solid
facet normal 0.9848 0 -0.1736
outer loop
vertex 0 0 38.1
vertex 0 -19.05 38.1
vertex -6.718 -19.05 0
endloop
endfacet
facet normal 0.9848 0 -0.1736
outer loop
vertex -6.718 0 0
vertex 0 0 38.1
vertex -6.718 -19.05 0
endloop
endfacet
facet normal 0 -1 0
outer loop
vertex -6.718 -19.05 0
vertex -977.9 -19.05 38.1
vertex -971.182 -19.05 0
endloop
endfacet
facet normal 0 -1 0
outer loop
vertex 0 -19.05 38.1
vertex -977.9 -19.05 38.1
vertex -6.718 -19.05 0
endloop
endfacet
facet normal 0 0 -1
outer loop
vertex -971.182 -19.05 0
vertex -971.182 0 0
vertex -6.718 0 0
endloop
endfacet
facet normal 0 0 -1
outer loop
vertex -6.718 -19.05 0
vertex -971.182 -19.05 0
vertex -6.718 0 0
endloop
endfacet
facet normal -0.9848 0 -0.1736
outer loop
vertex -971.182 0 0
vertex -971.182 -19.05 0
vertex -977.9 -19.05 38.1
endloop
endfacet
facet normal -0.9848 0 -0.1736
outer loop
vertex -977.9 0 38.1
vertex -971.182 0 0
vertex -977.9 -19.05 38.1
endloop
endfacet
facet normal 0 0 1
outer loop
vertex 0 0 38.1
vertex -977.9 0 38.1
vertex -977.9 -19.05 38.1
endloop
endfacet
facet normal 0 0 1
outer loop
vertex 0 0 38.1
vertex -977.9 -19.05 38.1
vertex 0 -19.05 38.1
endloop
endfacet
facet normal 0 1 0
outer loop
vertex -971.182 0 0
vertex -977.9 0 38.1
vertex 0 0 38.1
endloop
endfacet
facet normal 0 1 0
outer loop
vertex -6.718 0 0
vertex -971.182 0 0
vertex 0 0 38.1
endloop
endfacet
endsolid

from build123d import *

# Parameters (mm, degrees)
F0_W     = 977.9
F0_H     = 38.1
F1_DEPTH = 19.05
F3_DEPTH = 25.4
F5_DEPTH = 25.4


with BuildPart() as f1:
    # F0 (on Front) → F1 (new body)
    with BuildSketch(Plane.XZ):
        with Locations((-488.95, 19.05)):
            Rectangle(F0_W, F0_H)
    extrude(amount=F1_DEPTH)

    # F2 (on face) → F3 (cut)
    with BuildSketch(Plane.XZ.offset(19.05)):
        Polygon((-971.181942, 0), (-977.9, 38.1), (-977.9, 0), align=None)
    extrude(amount=-F3_DEPTH, mode=Mode.SUBTRACT)

    # F4 (on face) → F5 (cut)
    with BuildSketch(Plane.XZ.offset(19.05)):
        Polygon((0, 0), (0, 38.1), (-6.718058, 0), align=None)
    extrude(amount=-F5_DEPTH, mode=Mode.SUBTRACT)


solid = f1.part
